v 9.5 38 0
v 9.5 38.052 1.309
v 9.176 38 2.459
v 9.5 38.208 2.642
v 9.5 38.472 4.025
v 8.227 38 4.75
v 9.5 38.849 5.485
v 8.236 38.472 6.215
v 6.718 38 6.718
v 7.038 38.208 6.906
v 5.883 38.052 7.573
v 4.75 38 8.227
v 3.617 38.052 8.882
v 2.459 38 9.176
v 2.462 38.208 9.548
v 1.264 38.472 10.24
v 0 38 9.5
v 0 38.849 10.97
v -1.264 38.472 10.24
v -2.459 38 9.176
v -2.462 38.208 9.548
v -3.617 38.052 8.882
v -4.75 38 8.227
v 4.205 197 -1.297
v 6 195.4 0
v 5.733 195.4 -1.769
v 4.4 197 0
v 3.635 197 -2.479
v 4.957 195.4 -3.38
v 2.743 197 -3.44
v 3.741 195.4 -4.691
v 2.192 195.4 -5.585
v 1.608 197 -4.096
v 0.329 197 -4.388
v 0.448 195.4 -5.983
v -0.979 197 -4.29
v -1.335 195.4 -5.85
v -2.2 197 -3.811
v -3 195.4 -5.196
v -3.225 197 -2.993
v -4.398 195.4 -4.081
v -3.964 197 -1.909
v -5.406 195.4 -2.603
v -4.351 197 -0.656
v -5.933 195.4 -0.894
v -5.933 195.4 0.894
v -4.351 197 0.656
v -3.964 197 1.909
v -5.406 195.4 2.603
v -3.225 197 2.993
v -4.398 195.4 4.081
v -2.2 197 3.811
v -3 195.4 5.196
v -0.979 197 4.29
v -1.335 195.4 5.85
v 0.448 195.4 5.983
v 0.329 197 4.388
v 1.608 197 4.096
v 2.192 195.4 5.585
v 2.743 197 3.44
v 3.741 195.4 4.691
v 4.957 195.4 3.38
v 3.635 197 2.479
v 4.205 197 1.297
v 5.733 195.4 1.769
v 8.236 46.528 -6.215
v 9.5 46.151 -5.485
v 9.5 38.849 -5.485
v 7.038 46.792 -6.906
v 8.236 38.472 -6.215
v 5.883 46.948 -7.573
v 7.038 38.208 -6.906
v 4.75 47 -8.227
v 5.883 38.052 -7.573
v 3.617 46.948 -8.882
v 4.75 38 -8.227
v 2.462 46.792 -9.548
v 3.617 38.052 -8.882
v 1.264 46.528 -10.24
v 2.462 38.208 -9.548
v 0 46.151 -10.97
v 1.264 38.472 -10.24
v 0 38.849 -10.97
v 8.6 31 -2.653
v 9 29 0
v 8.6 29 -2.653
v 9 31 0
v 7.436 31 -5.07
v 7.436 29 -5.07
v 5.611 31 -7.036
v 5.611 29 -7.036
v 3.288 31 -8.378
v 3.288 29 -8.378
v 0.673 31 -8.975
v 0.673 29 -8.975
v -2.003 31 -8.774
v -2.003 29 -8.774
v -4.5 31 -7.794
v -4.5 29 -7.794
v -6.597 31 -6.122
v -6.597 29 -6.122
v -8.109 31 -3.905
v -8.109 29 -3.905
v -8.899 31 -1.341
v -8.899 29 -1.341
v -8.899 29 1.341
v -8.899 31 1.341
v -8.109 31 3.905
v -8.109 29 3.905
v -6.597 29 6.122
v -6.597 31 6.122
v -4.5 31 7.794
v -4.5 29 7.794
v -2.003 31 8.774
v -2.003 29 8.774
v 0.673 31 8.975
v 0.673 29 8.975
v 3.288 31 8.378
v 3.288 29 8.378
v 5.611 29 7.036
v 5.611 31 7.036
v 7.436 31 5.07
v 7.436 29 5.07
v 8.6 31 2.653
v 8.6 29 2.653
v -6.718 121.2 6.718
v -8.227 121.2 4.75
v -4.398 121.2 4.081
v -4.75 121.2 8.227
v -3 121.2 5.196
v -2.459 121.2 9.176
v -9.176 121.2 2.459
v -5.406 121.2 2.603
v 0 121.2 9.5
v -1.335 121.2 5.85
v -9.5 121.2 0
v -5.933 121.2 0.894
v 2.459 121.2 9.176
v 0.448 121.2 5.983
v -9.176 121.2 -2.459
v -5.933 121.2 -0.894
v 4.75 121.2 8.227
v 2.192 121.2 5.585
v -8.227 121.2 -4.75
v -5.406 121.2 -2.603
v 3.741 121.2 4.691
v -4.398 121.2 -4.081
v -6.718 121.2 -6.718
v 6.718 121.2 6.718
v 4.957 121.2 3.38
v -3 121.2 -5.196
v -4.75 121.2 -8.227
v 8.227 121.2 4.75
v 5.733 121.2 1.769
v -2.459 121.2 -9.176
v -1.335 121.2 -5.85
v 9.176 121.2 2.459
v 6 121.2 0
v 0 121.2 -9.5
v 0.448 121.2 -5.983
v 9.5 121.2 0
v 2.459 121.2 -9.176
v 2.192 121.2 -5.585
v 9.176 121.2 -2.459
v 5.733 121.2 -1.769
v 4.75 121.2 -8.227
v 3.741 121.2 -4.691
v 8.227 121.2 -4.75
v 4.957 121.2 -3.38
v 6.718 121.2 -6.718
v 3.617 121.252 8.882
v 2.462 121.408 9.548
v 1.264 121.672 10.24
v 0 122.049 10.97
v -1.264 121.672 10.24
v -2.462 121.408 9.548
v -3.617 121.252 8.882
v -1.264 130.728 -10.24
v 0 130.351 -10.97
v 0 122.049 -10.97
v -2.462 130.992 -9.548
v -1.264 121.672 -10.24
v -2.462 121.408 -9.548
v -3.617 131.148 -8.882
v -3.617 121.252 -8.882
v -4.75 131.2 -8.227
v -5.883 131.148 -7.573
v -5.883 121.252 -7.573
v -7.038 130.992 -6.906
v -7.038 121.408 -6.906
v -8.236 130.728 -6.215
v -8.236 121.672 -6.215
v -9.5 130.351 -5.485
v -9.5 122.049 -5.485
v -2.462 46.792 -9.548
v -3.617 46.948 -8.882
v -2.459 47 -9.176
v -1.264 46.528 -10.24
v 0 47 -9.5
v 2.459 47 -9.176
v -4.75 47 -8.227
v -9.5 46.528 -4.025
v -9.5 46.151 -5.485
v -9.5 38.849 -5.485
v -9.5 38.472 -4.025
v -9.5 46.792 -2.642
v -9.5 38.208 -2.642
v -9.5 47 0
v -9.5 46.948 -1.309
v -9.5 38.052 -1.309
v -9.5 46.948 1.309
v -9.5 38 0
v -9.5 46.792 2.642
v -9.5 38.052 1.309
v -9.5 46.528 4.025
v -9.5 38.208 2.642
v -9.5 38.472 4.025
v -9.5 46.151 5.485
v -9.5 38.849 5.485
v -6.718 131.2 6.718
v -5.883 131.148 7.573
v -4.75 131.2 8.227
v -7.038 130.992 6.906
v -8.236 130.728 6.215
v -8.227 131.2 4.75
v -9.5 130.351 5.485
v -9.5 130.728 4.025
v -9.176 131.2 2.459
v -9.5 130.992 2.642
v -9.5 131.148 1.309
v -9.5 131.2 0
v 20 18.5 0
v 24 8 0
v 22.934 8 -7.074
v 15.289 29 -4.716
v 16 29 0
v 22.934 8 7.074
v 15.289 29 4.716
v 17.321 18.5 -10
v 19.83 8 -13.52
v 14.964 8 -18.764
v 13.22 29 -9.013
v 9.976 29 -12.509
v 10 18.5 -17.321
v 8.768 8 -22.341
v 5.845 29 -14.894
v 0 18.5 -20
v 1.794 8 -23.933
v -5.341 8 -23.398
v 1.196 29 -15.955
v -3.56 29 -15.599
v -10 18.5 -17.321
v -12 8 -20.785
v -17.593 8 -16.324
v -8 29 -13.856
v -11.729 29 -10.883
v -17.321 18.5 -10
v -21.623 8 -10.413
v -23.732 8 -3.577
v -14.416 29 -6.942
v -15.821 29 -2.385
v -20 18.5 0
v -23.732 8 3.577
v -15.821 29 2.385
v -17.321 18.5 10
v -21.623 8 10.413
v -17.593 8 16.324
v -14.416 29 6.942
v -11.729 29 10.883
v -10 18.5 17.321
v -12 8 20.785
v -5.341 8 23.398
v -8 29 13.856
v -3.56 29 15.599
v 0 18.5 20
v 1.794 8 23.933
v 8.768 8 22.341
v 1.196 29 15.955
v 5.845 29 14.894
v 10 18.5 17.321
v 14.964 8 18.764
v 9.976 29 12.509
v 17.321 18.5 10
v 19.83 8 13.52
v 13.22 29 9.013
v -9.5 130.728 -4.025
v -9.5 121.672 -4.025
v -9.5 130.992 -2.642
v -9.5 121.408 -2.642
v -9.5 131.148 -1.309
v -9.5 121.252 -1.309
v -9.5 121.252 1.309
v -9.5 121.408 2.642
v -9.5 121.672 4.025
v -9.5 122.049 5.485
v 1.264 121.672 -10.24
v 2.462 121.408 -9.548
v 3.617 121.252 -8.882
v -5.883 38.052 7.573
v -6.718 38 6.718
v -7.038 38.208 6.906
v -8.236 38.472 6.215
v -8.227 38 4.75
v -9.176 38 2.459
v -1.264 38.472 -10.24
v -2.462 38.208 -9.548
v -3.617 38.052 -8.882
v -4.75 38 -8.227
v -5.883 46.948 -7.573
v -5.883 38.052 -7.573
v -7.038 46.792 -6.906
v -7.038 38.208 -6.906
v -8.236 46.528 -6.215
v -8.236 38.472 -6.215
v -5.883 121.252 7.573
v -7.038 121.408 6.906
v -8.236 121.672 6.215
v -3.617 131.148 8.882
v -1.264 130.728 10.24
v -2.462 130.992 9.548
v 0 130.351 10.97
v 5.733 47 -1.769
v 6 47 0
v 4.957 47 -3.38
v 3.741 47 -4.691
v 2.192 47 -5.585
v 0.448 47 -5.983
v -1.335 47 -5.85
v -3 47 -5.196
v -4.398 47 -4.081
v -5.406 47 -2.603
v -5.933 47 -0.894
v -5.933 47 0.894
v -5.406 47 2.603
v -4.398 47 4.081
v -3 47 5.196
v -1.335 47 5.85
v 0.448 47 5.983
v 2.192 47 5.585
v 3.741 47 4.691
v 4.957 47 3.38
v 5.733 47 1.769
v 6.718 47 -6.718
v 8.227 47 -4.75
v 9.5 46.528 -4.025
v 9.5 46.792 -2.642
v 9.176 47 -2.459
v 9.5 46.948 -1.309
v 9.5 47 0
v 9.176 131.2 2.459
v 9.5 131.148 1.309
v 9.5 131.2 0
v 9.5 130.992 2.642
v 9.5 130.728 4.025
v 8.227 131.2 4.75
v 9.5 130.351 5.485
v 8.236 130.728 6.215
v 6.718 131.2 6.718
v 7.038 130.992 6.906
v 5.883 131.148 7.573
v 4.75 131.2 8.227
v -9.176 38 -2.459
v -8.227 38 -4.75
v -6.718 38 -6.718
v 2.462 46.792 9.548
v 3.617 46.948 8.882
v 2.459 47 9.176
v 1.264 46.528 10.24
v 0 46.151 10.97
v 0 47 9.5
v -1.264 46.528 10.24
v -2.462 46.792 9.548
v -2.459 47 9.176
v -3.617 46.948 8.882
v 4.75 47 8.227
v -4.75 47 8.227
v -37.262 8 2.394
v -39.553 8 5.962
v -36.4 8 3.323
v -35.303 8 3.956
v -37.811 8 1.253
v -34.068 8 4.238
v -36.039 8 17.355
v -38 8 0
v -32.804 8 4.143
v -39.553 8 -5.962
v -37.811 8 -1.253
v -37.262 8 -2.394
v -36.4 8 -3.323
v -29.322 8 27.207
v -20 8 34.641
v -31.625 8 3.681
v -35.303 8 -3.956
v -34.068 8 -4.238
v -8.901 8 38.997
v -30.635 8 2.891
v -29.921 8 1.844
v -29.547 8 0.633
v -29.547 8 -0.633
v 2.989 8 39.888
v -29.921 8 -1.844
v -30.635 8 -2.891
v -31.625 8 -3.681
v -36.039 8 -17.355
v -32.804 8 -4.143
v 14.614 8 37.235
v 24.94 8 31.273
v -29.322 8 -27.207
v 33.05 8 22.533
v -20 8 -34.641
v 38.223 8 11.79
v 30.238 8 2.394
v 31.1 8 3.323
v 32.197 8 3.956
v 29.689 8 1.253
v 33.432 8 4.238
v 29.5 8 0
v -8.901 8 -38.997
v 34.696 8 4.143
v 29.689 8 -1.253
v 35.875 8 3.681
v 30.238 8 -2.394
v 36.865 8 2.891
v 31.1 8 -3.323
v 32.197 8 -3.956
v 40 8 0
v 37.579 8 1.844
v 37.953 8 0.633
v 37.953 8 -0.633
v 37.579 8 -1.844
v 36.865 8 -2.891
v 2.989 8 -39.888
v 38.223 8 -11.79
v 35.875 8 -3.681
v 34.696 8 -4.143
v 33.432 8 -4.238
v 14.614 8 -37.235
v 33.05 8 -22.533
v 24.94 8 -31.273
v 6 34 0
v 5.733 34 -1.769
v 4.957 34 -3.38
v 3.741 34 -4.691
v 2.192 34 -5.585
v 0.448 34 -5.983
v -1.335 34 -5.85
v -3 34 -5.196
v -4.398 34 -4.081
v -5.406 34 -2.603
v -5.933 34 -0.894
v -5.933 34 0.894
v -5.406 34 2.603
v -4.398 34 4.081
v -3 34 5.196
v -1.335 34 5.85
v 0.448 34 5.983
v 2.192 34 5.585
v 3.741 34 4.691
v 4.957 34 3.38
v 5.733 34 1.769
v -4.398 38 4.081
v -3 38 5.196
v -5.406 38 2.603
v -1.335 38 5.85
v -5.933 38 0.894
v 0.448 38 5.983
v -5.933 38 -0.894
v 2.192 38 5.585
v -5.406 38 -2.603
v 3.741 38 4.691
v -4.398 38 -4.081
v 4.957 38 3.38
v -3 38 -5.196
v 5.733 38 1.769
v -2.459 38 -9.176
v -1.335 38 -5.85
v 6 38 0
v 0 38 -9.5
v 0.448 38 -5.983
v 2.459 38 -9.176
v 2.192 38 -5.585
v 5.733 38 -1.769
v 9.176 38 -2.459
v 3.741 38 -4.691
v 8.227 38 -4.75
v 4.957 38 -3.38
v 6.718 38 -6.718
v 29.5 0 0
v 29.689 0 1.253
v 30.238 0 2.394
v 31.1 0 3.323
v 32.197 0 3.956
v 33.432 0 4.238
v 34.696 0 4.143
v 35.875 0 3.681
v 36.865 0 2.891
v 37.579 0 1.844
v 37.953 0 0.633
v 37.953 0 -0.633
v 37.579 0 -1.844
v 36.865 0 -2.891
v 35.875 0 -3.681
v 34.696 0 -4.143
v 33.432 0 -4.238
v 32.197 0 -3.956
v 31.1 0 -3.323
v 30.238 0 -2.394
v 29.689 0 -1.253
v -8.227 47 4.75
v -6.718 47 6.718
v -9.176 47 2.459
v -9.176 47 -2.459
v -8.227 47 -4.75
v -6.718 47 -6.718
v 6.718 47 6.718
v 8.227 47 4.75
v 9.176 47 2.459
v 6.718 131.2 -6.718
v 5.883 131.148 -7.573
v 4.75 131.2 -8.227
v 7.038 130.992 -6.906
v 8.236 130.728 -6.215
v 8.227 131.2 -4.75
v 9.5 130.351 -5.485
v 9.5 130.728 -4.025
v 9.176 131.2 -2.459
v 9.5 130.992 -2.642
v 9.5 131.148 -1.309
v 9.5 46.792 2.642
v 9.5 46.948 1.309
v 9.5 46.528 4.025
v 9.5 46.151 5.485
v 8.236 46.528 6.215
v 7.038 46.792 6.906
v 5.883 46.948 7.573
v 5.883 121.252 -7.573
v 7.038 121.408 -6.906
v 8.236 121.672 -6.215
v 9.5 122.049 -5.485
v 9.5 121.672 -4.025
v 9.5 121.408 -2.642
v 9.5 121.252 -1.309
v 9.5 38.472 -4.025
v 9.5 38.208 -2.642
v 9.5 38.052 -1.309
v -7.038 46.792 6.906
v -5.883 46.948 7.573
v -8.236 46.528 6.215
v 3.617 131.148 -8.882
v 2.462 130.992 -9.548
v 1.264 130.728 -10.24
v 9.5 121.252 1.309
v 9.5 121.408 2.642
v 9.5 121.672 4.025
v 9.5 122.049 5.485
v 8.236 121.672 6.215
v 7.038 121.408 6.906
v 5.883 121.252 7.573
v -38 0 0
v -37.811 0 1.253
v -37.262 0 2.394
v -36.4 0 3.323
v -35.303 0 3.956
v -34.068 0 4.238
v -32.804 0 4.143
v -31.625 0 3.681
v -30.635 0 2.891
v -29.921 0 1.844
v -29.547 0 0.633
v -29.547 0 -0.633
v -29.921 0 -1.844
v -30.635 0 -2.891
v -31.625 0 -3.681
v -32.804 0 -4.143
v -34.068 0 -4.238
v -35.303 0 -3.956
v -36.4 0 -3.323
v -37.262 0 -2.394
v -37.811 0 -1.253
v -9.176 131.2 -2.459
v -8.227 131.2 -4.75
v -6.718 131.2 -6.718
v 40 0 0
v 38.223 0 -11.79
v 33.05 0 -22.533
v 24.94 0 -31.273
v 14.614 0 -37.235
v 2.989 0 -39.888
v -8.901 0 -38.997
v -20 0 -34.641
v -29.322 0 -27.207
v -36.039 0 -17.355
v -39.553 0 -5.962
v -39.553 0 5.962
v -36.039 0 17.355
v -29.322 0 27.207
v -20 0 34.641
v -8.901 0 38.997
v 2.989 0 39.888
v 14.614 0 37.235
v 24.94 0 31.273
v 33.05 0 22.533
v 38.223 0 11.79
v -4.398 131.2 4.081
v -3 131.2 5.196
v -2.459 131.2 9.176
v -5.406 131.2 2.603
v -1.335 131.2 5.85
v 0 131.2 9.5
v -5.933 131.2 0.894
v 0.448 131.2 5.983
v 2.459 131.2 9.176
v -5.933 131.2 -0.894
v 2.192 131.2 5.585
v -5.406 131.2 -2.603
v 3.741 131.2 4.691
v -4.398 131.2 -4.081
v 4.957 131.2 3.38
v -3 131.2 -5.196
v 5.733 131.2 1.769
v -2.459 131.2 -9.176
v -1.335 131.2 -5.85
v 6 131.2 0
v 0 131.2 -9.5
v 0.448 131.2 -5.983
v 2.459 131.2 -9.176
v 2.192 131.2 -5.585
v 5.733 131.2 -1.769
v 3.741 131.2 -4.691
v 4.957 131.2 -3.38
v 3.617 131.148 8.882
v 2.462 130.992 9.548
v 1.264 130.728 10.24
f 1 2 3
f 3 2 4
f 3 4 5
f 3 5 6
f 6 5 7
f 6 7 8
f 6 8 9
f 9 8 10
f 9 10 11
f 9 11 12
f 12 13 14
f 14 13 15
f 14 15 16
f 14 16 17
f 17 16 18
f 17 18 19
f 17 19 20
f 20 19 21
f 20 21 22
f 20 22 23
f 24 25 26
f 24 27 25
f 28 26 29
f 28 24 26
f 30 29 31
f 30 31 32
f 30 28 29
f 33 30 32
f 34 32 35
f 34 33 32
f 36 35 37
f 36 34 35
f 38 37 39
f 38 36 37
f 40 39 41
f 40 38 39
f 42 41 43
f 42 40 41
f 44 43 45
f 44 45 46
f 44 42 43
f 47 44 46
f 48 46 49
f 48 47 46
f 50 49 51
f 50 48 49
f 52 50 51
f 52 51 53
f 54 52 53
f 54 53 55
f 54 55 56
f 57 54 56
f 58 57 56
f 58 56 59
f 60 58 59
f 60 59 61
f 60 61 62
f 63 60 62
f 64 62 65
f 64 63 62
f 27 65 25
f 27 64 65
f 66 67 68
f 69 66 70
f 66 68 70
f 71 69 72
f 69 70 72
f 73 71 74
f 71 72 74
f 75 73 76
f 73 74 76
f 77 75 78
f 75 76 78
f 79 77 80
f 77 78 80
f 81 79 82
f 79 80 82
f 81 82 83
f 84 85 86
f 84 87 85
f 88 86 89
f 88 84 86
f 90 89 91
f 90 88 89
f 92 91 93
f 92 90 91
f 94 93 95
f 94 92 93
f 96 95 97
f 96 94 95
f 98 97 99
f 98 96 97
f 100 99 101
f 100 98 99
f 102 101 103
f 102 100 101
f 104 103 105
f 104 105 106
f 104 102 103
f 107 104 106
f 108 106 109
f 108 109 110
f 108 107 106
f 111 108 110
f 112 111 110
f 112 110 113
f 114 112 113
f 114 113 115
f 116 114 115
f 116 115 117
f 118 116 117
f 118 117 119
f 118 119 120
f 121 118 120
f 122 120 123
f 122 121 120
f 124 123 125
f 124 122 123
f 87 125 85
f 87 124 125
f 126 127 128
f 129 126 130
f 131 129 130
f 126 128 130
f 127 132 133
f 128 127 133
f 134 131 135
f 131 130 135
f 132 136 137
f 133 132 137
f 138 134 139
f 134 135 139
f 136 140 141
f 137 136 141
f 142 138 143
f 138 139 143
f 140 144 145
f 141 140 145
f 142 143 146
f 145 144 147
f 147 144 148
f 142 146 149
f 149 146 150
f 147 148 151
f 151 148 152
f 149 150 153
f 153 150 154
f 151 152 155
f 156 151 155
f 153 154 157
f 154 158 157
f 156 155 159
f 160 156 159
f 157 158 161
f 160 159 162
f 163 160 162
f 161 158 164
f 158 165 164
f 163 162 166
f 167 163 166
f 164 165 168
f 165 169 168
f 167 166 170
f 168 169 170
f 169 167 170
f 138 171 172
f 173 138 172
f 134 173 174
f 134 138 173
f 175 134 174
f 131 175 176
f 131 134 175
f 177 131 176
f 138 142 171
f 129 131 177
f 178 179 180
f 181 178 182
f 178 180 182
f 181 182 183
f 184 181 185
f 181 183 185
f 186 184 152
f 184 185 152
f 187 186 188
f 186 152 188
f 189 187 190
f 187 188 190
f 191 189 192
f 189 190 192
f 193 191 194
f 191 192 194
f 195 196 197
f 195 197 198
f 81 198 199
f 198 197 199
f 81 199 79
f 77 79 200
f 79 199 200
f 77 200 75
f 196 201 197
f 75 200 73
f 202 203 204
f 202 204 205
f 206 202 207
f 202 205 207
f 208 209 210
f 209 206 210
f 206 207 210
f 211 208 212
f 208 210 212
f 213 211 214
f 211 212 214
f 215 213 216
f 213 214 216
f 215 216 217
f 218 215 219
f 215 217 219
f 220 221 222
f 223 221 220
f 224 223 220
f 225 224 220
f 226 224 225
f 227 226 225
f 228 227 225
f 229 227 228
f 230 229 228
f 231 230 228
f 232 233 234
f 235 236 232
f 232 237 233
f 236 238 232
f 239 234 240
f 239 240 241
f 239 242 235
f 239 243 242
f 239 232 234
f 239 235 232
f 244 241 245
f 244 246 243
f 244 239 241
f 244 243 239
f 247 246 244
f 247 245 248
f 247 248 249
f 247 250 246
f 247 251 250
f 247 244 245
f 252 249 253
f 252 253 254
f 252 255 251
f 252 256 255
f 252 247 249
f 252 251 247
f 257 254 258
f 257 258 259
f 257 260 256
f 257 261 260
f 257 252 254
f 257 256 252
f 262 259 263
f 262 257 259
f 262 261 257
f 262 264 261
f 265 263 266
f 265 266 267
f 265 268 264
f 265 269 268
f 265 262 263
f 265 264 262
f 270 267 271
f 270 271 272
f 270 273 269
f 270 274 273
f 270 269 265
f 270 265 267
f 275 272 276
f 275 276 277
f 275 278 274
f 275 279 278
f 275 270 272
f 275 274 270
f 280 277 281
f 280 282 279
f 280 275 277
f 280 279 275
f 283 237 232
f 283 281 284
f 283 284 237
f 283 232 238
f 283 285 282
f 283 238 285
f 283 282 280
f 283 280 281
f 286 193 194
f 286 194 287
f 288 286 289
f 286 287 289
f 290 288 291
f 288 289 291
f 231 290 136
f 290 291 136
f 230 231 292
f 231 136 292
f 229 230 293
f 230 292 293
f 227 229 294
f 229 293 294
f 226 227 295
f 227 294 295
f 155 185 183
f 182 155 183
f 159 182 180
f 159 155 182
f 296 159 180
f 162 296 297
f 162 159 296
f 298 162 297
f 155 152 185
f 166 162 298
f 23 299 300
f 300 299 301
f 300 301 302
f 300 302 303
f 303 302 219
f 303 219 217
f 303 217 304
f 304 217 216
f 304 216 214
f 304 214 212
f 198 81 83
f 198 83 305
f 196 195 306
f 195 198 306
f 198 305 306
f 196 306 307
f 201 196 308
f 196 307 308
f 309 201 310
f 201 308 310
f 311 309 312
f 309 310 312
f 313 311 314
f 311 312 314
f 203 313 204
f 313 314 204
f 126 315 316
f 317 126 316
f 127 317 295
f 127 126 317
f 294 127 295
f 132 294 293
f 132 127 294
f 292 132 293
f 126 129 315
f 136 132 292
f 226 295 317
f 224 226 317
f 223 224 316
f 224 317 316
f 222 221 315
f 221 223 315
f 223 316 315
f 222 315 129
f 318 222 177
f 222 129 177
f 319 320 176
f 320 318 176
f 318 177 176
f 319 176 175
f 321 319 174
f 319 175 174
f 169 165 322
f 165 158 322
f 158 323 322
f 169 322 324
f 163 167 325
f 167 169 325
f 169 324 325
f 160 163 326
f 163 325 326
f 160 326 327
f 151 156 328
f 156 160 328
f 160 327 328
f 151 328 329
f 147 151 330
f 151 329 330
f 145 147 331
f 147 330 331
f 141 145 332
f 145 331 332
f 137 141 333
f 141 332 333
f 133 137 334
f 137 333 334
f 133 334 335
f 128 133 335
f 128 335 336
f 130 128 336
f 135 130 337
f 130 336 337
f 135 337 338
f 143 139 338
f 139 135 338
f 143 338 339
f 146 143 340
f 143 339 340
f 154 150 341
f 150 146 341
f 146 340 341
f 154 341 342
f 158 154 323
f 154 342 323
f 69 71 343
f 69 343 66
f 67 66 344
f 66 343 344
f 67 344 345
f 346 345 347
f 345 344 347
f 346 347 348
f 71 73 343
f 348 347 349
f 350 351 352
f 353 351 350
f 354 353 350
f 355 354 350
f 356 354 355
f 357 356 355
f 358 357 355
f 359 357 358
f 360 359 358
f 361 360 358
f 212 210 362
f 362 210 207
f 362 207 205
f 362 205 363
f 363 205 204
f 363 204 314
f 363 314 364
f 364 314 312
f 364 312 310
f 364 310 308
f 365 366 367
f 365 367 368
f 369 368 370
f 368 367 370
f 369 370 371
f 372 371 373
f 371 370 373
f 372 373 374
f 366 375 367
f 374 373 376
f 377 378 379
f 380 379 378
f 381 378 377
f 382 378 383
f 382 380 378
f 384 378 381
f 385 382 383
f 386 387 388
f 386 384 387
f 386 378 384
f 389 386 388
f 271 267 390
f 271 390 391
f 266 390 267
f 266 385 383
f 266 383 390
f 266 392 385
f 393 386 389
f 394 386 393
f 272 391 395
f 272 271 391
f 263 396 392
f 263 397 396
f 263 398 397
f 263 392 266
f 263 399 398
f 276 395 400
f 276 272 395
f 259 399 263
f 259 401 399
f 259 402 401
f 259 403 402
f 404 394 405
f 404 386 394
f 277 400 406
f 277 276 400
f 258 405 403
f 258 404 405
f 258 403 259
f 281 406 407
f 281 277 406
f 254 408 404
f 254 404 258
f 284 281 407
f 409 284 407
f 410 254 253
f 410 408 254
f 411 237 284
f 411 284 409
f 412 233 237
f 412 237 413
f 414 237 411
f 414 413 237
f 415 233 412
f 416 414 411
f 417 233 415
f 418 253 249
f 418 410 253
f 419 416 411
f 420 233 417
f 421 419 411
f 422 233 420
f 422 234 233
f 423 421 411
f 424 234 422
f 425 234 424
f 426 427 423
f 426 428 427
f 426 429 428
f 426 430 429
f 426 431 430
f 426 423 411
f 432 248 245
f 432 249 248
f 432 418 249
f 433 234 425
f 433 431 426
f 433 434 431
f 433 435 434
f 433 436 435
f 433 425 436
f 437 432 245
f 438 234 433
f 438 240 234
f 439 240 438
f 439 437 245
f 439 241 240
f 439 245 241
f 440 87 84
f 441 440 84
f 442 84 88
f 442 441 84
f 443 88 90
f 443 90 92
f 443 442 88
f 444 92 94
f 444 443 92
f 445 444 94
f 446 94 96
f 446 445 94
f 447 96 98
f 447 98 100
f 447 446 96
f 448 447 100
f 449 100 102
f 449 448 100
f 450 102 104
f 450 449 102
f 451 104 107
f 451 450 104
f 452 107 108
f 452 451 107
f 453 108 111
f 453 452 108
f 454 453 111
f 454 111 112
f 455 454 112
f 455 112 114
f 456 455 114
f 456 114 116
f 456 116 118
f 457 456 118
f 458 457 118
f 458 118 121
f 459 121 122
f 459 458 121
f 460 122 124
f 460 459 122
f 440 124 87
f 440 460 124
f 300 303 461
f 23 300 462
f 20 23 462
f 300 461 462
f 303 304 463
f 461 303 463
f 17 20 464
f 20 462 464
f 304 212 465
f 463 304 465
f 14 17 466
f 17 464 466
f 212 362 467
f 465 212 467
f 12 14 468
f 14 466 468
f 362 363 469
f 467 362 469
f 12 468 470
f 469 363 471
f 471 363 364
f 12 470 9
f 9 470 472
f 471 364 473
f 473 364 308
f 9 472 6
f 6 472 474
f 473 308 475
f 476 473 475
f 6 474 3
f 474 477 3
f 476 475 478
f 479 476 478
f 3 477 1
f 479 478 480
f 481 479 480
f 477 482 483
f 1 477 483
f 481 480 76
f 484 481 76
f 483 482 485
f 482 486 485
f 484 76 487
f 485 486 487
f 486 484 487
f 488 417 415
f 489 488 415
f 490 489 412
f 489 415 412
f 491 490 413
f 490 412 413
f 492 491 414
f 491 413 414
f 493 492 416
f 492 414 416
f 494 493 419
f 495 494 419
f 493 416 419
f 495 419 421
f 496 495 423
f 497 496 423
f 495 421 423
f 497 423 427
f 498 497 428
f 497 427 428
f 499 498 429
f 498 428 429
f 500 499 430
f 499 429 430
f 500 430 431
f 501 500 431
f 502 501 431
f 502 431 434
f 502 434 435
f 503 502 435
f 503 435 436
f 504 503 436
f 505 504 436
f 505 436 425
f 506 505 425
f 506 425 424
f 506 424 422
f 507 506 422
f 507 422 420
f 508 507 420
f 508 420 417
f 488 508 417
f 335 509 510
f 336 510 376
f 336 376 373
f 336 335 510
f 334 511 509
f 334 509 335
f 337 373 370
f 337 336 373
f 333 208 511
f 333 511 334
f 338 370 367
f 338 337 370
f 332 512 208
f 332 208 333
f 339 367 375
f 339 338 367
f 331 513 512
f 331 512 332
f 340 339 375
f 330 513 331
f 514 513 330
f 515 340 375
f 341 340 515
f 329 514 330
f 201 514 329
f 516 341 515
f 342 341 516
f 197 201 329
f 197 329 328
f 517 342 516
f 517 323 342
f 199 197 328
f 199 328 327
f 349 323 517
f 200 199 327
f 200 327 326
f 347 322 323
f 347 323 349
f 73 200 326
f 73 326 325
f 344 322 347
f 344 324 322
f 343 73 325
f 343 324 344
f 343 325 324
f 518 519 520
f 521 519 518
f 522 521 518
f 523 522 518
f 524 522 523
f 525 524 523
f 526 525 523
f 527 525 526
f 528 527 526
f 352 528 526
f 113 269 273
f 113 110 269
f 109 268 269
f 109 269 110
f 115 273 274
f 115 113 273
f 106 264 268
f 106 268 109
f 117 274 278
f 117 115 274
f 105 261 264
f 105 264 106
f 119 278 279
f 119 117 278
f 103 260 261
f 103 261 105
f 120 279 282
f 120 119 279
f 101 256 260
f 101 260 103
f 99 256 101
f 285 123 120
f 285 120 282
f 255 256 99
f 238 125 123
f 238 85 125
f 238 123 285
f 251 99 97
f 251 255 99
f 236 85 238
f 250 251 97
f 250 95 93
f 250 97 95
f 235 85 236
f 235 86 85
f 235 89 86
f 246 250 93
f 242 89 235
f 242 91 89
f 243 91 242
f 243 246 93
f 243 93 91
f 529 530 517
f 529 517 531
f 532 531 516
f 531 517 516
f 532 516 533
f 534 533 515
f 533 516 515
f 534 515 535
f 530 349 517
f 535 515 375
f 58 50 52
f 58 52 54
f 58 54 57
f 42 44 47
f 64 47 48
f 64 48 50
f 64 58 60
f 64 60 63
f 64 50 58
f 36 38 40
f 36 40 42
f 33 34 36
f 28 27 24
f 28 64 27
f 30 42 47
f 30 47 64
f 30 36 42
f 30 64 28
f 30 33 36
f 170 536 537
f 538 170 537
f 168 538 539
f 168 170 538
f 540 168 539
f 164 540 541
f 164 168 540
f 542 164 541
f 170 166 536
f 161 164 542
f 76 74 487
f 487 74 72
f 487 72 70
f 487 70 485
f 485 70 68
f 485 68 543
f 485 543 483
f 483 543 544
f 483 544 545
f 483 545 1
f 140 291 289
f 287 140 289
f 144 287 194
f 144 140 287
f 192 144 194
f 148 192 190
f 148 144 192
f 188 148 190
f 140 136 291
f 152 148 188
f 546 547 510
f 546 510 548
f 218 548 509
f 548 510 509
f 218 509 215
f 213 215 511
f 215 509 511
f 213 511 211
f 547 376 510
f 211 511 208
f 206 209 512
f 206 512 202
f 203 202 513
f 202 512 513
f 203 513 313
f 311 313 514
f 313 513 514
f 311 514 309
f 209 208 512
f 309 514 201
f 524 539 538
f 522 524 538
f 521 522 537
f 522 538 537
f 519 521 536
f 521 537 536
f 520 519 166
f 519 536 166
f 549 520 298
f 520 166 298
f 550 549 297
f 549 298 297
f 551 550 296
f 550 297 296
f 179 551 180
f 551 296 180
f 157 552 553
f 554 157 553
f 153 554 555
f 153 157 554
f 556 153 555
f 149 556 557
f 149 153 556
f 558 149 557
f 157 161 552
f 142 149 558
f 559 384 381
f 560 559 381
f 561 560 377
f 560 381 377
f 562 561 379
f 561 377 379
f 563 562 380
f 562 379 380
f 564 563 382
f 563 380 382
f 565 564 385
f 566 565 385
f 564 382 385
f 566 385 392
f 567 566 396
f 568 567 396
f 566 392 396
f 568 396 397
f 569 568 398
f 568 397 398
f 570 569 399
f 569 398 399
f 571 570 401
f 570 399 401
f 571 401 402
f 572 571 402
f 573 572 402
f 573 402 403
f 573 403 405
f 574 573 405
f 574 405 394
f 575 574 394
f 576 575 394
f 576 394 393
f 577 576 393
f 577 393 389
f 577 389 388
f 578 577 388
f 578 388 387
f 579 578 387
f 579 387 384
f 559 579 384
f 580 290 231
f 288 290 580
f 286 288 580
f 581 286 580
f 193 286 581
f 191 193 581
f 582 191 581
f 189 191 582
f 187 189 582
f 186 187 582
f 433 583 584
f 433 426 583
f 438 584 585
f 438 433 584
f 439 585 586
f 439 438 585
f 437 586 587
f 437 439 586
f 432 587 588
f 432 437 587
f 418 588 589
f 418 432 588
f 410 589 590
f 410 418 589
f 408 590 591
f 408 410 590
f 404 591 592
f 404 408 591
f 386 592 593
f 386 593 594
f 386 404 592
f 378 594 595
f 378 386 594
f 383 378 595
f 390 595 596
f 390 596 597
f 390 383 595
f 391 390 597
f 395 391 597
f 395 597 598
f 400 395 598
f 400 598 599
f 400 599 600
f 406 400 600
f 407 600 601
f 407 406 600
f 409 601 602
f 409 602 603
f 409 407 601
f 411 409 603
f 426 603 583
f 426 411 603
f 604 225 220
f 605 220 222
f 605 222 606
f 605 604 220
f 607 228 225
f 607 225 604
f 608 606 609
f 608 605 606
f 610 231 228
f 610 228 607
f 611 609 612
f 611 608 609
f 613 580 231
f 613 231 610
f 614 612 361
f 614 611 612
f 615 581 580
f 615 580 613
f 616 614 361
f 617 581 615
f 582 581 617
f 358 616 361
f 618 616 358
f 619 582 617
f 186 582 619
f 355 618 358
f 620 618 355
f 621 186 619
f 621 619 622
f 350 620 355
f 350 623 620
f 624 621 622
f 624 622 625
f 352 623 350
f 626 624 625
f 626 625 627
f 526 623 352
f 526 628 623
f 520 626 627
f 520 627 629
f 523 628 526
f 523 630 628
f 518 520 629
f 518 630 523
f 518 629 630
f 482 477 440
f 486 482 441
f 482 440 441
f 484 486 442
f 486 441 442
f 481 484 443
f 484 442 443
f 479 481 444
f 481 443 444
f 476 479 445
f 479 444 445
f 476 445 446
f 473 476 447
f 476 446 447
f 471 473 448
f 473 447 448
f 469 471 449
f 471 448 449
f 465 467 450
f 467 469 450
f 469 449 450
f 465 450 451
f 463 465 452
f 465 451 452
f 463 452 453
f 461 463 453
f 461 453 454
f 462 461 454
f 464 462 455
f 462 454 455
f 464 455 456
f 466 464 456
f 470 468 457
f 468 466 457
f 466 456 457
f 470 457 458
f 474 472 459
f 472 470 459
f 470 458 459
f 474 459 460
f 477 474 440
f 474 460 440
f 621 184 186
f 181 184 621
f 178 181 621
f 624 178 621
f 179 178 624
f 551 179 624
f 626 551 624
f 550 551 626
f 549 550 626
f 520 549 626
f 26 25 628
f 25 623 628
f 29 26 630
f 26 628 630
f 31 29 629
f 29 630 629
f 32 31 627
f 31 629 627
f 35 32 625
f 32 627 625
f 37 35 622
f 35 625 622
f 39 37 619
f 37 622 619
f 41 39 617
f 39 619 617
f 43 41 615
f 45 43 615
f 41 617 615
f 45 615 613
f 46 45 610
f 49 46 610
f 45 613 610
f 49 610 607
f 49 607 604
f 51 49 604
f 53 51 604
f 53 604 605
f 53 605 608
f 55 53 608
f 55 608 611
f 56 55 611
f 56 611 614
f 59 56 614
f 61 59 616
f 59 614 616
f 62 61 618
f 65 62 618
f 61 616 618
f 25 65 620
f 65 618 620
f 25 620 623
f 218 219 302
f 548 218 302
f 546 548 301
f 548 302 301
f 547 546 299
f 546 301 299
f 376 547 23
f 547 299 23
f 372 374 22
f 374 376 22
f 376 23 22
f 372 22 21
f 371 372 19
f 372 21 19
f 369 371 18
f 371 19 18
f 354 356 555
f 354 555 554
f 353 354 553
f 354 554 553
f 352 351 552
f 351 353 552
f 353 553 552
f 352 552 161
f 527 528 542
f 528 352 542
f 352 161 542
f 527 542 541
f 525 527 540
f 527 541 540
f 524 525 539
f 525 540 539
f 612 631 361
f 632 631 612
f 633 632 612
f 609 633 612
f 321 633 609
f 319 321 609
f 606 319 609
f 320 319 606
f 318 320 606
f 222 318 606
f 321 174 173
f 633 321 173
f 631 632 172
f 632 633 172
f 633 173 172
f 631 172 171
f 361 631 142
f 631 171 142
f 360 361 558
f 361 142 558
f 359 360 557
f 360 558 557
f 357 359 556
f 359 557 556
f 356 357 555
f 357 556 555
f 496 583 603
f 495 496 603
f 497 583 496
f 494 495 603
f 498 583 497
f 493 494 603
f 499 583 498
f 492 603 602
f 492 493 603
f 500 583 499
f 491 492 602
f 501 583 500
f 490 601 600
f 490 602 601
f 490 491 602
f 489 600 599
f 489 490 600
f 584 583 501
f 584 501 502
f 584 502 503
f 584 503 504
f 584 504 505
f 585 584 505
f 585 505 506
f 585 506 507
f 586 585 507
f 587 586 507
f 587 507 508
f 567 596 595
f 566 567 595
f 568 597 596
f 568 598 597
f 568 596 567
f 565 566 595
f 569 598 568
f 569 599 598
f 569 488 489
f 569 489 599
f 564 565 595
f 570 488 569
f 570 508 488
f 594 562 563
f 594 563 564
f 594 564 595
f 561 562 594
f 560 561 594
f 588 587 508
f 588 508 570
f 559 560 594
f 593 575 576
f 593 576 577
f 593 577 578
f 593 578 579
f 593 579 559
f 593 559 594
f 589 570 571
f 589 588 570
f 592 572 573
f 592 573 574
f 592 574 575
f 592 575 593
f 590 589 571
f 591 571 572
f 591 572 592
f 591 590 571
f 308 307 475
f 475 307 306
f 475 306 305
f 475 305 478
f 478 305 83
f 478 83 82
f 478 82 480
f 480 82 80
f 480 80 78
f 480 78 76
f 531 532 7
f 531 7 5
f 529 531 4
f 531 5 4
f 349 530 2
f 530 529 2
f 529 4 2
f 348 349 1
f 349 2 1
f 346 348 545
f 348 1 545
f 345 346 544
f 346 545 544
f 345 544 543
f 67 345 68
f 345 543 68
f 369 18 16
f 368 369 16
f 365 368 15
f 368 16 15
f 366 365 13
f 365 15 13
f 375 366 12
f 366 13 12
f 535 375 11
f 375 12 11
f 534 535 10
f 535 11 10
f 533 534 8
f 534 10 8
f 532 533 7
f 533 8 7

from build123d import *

# Parameters (mm, degrees)
EXTRUDE_1_DEPTH     = 9
EXTRUDE_2_DEPTH     = 10
SKETCH_5_R          = 4.25
CUT_EXTRUDE_1_DEPTH = 9


with BuildPart() as part:
    # Эскиз1 → Повернуть1 (revolve)
    with BuildSketch(Plane.XY, mode=Mode.PRIVATE) as revolve_1_sk:
        Polygon((0, 0), (-40, 0), (-40, 8), (-24, 8), (-16, 29), (-9, 29), (-9, 31), (-6, 34), (-6, 38), (-6, 47), (-6, 195.4), (-4.4, 197), (0, 197), align=None)
    revolve(revolve_1_sk.sketch.rotate(Axis((0, 0, 0), (0, 1, 0)), 180), axis=Axis((0, 0, 0), (0, 1, 0)))  # turned: the seam where the file's is

    # Эскиз2 → Бобышка-Вытянуть1 (add)
    with BuildSketch(Plane(origin=(0, 38, 0), x_dir=(1, 0, 0), z_dir=(0, 1, 0))):
        Polygon((0, 10.969655115), (-9.5, 5.484827557), (-9.5, -5.484827557), (0, -10.969655115), (9.5, -5.484827557), (9.5, 5.484827557), align=None)
    extrude(amount=EXTRUDE_1_DEPTH)

    # Эскиз3 → Бобышка-Вытянуть2 (add)
    with BuildSketch(Plane(origin=(0, 121.2, 0), x_dir=(1, 0, 0), z_dir=(0, 1, 0))):
        Polygon((9.5, 5.484827557), (0, 10.969655115), (-9.5, 5.484827557), (-9.5, -5.484827557), (0, -10.969655115), (9.5, -5.484827557), align=None)
    extrude(amount=EXTRUDE_2_DEPTH)

    # Эскиз4 → Вырез-Повернуть2 (revolve, cut)
    with BuildSketch(Plane.XY, mode=Mode.PRIVATE) as cut_revolve_2_sk:
        Polygon((-18.160254038, 131.2), (-9.5, 131.2), (-18.160254038, 126.2), align=None)
        Polygon((-18.160254038, 121.2), (-18.160254038, 126.2), (-9.5, 121.2), align=None)
        Polygon((-17.294228634, 47), (-17.294228634, 42.5), (-9.5, 47), align=None)
        Polygon((-17.294228634, 42.5), (-17.294228634, 38), (-9.5, 38), align=None)
    revolve(cut_revolve_2_sk.sketch.rotate(Axis((0, 197, 0), (0, -1, 0)), 180), axis=Axis((0, 197, 0), (0, -1, 0)), mode=Mode.SUBTRACT)  # turned: the seam where the file's is

    # Эскиз5 → Вырез-Вытянуть1 (cut, through all)
    with BuildSketch(Plane(origin=(0, 8, 0), x_dir=(1, 0, 0), z_dir=(0, 1, 0))):
        with Locations(Location((-33.75, 0, 0), (0, 0, 180))):  # turned: the seam where the file's is
            Circle(SKETCH_5_R)
        with Locations(Location((33.75, 0, 0), (0, 0, 180))):  # turned: the seam where the file's is
            Circle(SKETCH_5_R)
    extrude(amount=-CUT_EXTRUDE_1_DEPTH, mode=Mode.SUBTRACT)


solid = part.part
